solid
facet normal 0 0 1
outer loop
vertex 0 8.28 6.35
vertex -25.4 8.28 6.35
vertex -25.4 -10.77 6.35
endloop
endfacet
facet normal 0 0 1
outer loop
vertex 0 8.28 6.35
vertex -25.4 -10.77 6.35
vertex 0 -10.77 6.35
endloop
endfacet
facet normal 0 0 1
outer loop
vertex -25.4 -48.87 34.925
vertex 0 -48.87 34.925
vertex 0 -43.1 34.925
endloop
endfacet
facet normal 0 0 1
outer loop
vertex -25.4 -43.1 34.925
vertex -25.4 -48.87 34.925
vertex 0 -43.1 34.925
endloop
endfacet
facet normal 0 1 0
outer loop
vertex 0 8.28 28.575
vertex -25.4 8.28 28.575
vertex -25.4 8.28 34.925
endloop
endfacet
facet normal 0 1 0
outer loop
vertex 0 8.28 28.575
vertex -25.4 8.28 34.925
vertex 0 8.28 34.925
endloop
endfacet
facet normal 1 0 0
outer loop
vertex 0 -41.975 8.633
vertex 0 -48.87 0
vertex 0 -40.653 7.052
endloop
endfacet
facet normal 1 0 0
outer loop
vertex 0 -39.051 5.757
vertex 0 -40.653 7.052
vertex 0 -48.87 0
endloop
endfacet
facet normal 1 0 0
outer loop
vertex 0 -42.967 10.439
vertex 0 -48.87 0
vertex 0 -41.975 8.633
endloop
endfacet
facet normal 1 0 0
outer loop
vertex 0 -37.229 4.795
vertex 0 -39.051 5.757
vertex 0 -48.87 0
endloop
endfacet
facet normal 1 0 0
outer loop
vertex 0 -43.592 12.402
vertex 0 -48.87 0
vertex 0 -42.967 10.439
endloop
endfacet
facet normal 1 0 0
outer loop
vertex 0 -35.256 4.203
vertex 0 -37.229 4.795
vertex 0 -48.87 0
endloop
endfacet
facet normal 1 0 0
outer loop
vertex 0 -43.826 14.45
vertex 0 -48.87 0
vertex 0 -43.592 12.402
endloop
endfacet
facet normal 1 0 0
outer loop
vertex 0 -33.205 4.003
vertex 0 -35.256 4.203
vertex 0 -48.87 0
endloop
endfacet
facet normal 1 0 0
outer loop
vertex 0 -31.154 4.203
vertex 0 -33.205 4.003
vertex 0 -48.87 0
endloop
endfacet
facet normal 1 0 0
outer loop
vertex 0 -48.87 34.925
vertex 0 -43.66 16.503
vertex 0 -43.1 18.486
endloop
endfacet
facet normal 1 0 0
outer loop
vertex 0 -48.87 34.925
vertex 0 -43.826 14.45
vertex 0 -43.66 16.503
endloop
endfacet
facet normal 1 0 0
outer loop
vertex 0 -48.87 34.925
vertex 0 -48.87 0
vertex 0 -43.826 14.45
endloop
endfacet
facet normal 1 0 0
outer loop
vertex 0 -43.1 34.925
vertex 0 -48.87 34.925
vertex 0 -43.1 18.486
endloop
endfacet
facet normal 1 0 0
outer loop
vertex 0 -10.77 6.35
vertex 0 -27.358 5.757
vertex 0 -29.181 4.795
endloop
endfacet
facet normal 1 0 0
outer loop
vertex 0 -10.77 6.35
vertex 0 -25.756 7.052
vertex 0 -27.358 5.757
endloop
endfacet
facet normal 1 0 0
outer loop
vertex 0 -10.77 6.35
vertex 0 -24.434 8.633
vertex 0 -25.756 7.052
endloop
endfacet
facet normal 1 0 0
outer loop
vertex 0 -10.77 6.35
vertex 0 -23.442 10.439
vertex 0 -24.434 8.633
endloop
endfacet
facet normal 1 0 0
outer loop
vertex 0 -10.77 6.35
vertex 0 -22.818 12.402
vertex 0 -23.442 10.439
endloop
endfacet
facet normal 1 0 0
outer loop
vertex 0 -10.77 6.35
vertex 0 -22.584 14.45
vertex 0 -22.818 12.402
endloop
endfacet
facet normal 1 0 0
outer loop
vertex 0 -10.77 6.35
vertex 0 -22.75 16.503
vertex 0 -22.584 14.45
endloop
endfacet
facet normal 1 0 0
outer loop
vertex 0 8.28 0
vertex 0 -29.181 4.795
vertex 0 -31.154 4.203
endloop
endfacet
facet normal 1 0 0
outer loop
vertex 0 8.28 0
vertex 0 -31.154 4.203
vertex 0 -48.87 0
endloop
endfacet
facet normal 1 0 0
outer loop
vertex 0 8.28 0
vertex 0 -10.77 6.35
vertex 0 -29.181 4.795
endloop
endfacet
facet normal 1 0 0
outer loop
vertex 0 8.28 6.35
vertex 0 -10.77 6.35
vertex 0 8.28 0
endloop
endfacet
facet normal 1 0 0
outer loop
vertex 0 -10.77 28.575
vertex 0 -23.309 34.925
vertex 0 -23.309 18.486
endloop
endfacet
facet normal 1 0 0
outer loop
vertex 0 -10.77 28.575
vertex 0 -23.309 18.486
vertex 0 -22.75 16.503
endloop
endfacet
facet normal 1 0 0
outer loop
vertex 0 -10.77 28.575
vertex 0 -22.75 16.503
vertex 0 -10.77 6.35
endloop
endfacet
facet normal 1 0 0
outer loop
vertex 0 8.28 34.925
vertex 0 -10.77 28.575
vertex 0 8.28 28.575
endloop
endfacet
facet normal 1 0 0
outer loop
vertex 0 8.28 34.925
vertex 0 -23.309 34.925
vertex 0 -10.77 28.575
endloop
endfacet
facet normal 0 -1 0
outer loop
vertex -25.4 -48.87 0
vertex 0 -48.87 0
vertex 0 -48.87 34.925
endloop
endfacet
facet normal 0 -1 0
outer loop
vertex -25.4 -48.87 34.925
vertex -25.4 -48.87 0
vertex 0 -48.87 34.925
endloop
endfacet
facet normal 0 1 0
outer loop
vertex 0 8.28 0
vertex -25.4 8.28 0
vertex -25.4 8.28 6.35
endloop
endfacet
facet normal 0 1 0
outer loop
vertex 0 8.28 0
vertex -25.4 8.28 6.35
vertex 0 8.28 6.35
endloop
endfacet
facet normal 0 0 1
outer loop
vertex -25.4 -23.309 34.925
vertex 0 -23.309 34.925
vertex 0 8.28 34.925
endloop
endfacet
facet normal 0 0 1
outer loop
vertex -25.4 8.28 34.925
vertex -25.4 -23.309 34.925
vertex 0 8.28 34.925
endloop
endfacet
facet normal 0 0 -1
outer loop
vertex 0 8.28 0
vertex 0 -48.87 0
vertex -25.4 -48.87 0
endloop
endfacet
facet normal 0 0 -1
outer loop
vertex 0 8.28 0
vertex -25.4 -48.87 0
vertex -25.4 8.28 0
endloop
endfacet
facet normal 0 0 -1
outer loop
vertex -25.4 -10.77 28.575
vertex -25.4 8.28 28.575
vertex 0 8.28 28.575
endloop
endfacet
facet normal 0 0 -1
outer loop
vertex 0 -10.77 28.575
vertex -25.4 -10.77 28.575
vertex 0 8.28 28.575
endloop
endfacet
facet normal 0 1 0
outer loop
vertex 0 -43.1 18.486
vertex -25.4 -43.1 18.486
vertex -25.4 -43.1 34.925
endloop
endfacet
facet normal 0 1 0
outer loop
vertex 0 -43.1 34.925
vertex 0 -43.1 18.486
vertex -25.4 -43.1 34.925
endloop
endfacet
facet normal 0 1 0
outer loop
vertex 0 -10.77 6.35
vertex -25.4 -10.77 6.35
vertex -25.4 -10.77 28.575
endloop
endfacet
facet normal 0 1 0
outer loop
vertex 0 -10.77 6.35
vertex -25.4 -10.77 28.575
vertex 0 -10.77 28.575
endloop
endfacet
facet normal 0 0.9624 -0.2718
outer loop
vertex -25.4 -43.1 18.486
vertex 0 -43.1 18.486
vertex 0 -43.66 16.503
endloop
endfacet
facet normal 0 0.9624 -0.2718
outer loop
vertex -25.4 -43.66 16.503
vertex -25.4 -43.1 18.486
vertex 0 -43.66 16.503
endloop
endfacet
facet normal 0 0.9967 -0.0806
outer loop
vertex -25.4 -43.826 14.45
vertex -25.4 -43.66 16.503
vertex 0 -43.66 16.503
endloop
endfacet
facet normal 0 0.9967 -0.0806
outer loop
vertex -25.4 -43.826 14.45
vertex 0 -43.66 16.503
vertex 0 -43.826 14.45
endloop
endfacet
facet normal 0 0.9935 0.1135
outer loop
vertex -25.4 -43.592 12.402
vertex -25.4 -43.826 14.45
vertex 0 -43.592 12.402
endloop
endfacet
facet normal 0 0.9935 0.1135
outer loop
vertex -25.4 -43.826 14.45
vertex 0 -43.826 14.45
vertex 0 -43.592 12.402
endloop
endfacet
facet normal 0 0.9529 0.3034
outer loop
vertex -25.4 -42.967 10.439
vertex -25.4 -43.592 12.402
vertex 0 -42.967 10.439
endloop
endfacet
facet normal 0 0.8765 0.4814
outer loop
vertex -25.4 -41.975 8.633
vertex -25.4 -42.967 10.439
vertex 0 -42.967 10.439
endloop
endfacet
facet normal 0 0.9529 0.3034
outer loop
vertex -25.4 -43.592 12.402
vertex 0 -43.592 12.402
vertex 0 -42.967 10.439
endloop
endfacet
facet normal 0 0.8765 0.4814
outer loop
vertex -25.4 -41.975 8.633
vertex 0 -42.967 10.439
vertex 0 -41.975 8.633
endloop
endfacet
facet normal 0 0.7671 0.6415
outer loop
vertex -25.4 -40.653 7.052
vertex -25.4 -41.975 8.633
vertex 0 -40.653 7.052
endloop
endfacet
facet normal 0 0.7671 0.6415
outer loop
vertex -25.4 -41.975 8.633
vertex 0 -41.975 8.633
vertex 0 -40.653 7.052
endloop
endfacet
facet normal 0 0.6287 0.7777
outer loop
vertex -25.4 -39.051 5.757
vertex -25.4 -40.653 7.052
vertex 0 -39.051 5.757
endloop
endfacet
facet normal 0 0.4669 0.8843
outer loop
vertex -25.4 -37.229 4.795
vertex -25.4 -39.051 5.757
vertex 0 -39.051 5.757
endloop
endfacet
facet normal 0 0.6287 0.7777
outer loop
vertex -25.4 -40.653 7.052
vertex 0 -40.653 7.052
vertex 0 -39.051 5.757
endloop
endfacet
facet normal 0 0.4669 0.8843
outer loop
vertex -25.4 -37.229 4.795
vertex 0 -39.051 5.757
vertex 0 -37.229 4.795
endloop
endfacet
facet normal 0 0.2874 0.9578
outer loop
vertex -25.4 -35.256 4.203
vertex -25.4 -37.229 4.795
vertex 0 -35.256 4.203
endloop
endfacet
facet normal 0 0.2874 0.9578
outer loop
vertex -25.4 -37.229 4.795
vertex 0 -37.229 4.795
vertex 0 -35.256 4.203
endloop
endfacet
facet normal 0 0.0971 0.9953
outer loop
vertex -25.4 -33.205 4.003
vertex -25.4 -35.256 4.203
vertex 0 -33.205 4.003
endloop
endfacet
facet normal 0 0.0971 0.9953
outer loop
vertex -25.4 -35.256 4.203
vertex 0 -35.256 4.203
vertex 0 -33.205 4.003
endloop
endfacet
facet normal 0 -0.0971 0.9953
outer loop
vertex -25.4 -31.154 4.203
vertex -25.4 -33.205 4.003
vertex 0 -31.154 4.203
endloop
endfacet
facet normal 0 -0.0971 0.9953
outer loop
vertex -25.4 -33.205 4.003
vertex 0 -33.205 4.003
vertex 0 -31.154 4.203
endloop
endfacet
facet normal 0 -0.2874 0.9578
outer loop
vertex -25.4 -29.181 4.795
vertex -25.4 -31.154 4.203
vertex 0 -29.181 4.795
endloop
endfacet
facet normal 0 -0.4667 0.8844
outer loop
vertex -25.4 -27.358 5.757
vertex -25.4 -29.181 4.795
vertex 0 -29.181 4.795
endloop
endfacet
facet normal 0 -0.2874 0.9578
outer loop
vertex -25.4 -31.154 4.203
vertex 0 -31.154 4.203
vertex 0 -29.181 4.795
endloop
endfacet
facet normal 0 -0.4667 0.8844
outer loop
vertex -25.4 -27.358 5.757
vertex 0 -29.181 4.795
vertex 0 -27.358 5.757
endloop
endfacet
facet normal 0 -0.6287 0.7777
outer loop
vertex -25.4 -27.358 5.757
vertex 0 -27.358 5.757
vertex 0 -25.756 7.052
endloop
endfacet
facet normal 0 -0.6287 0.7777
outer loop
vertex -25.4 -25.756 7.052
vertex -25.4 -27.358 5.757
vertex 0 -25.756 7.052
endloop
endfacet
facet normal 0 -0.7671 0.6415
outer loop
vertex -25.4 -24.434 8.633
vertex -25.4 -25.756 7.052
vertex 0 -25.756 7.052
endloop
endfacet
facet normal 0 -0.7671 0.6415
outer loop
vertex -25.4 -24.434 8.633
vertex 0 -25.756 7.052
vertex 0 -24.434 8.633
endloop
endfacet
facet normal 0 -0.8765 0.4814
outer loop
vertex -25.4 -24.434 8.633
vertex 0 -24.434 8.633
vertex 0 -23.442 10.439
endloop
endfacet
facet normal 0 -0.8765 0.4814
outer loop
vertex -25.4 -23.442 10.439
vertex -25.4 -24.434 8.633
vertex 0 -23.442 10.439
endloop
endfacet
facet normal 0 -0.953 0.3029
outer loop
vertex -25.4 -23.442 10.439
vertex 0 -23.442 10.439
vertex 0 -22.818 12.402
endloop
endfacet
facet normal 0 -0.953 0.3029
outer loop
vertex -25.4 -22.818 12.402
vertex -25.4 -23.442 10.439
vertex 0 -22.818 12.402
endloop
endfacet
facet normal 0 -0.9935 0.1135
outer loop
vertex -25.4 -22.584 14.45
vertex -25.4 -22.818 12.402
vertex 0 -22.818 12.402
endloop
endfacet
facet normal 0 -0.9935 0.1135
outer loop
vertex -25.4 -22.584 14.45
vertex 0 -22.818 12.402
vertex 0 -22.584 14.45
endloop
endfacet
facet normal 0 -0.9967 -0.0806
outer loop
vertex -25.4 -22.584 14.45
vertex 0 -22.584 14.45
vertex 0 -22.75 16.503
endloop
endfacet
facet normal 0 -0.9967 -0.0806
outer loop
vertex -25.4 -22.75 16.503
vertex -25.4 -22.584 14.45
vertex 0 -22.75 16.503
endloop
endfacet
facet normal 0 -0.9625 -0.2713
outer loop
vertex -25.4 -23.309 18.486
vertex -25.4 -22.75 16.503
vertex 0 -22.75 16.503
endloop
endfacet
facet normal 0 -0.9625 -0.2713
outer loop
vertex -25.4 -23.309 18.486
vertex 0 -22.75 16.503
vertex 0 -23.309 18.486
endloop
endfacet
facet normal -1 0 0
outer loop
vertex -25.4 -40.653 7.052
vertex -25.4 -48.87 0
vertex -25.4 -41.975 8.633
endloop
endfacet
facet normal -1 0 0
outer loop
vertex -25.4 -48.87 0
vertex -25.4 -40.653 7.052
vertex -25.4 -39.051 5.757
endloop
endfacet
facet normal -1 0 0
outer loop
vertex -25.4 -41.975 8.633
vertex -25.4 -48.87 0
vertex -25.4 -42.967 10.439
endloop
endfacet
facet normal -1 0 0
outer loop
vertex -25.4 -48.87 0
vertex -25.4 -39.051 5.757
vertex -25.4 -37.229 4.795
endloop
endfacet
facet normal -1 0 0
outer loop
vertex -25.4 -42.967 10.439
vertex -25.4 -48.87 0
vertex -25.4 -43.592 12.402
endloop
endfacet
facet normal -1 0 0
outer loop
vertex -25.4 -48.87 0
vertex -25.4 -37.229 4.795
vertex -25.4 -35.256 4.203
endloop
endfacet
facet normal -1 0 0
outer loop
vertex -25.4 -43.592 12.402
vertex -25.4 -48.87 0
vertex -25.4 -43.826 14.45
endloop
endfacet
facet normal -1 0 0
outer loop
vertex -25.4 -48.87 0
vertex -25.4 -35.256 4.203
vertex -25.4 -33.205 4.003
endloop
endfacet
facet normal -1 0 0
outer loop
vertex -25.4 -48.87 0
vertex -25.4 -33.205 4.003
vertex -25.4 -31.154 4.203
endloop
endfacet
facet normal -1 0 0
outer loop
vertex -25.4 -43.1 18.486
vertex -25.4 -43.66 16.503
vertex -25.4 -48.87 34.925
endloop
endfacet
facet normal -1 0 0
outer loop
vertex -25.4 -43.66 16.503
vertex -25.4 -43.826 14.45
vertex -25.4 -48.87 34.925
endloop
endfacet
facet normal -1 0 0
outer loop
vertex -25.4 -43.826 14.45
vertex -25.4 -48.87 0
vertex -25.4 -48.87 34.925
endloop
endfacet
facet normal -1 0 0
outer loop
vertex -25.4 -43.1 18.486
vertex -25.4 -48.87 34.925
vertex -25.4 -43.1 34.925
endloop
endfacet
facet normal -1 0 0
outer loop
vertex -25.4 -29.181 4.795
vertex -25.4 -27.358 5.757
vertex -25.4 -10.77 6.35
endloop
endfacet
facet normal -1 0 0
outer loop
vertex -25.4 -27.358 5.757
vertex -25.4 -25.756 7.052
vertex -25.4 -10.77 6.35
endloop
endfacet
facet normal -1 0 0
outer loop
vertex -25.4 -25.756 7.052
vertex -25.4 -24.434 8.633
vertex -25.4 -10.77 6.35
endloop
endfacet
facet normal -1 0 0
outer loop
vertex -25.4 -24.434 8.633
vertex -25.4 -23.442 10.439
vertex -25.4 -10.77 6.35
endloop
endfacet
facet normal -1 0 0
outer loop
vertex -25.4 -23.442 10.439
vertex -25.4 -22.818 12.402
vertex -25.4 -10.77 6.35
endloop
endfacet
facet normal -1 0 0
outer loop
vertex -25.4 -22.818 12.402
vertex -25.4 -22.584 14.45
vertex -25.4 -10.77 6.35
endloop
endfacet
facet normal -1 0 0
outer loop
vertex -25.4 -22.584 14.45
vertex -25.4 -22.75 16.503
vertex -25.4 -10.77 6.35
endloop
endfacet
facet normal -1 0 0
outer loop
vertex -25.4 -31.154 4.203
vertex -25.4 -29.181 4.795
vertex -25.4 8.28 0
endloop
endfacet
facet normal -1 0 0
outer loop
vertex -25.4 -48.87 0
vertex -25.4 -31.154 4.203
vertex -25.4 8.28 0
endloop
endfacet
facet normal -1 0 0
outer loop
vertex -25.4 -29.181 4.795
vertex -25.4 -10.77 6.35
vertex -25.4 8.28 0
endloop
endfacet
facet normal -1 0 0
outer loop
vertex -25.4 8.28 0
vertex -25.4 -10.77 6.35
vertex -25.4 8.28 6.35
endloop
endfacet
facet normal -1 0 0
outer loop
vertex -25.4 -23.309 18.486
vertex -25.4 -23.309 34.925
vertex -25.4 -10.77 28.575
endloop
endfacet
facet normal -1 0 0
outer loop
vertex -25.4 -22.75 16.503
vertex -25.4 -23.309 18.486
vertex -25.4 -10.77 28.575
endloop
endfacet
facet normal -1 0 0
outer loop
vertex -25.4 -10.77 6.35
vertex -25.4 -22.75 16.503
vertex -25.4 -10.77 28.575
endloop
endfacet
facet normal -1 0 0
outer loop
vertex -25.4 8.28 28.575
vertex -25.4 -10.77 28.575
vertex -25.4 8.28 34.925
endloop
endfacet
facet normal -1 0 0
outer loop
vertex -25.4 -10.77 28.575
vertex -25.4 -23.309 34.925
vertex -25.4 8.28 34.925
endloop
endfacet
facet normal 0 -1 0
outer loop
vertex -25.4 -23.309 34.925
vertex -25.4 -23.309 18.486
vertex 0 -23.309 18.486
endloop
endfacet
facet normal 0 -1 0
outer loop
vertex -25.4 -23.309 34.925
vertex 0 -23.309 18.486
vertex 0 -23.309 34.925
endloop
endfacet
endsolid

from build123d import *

# Parameters (mm, degrees)
F0_W     = 25.4
F0_H     = 31.75
F2_DEPTH = 6.35
F1_W     = 25.4
F1_H     = 12.7
F3_DEPTH = 28.575
F4_W     = 25.4
F4_H     = 31.75
F5_DEPTH = 6.35
F6_W     = 25.4
F6_H     = 34.925
F7_DEPTH = 25.4
F8_W     = 19.7909511626
F8_H     = 16.4385318786
F9_DEPTH = 33.782


with BuildPart() as f2:
    # F0 (on Top) → F2 (new body)
    with BuildSketch(Plane.XY):
        with Locations((-12.7, -7.5953084708)):
            Rectangle(F0_W, F0_H)
    extrude(amount=F2_DEPTH)

    # F1 (on face) → F3 (join)
    with BuildSketch(Plane.XY):
        with Locations((-12.7, -17.1203084708)):
            Rectangle(F1_W, F1_H)
    extrude(amount=F3_DEPTH)

    # F4 (on face) → F5 (join)
    with BuildSketch(Plane.XY.offset(28.575)):
        with Locations((-12.7, -7.5953084708)):
            Rectangle(F4_W, F4_H)
    extrude(amount=F5_DEPTH)

    # F6 (on Right) → F7 (join)
    with BuildSketch(Plane.YZ):
        with Locations((-36.1703084708, 17.4625)):
            Rectangle(F6_W, F6_H)
    extrude(amount=-F7_DEPTH)

    # F8 (on face) → F9 (cut)
    with BuildSketch(Plane.YZ):
        with Locations((-33.2048367709, 26.7057340607)):
            Rectangle(F8_W, F8_H)
        with BuildLine():
            Line((-23.3093611896, 18.4864681214), (-43.1003123522, 18.4864681214))
            ThreePointArc((-43.1003123522, 18.4864681214), (-33.2048367709, 4.0030932476), (-23.3093611896, 18.4864681214))
        make_face()
    extrude(amount=-F9_DEPTH, mode=Mode.SUBTRACT)


solid = f2.part
